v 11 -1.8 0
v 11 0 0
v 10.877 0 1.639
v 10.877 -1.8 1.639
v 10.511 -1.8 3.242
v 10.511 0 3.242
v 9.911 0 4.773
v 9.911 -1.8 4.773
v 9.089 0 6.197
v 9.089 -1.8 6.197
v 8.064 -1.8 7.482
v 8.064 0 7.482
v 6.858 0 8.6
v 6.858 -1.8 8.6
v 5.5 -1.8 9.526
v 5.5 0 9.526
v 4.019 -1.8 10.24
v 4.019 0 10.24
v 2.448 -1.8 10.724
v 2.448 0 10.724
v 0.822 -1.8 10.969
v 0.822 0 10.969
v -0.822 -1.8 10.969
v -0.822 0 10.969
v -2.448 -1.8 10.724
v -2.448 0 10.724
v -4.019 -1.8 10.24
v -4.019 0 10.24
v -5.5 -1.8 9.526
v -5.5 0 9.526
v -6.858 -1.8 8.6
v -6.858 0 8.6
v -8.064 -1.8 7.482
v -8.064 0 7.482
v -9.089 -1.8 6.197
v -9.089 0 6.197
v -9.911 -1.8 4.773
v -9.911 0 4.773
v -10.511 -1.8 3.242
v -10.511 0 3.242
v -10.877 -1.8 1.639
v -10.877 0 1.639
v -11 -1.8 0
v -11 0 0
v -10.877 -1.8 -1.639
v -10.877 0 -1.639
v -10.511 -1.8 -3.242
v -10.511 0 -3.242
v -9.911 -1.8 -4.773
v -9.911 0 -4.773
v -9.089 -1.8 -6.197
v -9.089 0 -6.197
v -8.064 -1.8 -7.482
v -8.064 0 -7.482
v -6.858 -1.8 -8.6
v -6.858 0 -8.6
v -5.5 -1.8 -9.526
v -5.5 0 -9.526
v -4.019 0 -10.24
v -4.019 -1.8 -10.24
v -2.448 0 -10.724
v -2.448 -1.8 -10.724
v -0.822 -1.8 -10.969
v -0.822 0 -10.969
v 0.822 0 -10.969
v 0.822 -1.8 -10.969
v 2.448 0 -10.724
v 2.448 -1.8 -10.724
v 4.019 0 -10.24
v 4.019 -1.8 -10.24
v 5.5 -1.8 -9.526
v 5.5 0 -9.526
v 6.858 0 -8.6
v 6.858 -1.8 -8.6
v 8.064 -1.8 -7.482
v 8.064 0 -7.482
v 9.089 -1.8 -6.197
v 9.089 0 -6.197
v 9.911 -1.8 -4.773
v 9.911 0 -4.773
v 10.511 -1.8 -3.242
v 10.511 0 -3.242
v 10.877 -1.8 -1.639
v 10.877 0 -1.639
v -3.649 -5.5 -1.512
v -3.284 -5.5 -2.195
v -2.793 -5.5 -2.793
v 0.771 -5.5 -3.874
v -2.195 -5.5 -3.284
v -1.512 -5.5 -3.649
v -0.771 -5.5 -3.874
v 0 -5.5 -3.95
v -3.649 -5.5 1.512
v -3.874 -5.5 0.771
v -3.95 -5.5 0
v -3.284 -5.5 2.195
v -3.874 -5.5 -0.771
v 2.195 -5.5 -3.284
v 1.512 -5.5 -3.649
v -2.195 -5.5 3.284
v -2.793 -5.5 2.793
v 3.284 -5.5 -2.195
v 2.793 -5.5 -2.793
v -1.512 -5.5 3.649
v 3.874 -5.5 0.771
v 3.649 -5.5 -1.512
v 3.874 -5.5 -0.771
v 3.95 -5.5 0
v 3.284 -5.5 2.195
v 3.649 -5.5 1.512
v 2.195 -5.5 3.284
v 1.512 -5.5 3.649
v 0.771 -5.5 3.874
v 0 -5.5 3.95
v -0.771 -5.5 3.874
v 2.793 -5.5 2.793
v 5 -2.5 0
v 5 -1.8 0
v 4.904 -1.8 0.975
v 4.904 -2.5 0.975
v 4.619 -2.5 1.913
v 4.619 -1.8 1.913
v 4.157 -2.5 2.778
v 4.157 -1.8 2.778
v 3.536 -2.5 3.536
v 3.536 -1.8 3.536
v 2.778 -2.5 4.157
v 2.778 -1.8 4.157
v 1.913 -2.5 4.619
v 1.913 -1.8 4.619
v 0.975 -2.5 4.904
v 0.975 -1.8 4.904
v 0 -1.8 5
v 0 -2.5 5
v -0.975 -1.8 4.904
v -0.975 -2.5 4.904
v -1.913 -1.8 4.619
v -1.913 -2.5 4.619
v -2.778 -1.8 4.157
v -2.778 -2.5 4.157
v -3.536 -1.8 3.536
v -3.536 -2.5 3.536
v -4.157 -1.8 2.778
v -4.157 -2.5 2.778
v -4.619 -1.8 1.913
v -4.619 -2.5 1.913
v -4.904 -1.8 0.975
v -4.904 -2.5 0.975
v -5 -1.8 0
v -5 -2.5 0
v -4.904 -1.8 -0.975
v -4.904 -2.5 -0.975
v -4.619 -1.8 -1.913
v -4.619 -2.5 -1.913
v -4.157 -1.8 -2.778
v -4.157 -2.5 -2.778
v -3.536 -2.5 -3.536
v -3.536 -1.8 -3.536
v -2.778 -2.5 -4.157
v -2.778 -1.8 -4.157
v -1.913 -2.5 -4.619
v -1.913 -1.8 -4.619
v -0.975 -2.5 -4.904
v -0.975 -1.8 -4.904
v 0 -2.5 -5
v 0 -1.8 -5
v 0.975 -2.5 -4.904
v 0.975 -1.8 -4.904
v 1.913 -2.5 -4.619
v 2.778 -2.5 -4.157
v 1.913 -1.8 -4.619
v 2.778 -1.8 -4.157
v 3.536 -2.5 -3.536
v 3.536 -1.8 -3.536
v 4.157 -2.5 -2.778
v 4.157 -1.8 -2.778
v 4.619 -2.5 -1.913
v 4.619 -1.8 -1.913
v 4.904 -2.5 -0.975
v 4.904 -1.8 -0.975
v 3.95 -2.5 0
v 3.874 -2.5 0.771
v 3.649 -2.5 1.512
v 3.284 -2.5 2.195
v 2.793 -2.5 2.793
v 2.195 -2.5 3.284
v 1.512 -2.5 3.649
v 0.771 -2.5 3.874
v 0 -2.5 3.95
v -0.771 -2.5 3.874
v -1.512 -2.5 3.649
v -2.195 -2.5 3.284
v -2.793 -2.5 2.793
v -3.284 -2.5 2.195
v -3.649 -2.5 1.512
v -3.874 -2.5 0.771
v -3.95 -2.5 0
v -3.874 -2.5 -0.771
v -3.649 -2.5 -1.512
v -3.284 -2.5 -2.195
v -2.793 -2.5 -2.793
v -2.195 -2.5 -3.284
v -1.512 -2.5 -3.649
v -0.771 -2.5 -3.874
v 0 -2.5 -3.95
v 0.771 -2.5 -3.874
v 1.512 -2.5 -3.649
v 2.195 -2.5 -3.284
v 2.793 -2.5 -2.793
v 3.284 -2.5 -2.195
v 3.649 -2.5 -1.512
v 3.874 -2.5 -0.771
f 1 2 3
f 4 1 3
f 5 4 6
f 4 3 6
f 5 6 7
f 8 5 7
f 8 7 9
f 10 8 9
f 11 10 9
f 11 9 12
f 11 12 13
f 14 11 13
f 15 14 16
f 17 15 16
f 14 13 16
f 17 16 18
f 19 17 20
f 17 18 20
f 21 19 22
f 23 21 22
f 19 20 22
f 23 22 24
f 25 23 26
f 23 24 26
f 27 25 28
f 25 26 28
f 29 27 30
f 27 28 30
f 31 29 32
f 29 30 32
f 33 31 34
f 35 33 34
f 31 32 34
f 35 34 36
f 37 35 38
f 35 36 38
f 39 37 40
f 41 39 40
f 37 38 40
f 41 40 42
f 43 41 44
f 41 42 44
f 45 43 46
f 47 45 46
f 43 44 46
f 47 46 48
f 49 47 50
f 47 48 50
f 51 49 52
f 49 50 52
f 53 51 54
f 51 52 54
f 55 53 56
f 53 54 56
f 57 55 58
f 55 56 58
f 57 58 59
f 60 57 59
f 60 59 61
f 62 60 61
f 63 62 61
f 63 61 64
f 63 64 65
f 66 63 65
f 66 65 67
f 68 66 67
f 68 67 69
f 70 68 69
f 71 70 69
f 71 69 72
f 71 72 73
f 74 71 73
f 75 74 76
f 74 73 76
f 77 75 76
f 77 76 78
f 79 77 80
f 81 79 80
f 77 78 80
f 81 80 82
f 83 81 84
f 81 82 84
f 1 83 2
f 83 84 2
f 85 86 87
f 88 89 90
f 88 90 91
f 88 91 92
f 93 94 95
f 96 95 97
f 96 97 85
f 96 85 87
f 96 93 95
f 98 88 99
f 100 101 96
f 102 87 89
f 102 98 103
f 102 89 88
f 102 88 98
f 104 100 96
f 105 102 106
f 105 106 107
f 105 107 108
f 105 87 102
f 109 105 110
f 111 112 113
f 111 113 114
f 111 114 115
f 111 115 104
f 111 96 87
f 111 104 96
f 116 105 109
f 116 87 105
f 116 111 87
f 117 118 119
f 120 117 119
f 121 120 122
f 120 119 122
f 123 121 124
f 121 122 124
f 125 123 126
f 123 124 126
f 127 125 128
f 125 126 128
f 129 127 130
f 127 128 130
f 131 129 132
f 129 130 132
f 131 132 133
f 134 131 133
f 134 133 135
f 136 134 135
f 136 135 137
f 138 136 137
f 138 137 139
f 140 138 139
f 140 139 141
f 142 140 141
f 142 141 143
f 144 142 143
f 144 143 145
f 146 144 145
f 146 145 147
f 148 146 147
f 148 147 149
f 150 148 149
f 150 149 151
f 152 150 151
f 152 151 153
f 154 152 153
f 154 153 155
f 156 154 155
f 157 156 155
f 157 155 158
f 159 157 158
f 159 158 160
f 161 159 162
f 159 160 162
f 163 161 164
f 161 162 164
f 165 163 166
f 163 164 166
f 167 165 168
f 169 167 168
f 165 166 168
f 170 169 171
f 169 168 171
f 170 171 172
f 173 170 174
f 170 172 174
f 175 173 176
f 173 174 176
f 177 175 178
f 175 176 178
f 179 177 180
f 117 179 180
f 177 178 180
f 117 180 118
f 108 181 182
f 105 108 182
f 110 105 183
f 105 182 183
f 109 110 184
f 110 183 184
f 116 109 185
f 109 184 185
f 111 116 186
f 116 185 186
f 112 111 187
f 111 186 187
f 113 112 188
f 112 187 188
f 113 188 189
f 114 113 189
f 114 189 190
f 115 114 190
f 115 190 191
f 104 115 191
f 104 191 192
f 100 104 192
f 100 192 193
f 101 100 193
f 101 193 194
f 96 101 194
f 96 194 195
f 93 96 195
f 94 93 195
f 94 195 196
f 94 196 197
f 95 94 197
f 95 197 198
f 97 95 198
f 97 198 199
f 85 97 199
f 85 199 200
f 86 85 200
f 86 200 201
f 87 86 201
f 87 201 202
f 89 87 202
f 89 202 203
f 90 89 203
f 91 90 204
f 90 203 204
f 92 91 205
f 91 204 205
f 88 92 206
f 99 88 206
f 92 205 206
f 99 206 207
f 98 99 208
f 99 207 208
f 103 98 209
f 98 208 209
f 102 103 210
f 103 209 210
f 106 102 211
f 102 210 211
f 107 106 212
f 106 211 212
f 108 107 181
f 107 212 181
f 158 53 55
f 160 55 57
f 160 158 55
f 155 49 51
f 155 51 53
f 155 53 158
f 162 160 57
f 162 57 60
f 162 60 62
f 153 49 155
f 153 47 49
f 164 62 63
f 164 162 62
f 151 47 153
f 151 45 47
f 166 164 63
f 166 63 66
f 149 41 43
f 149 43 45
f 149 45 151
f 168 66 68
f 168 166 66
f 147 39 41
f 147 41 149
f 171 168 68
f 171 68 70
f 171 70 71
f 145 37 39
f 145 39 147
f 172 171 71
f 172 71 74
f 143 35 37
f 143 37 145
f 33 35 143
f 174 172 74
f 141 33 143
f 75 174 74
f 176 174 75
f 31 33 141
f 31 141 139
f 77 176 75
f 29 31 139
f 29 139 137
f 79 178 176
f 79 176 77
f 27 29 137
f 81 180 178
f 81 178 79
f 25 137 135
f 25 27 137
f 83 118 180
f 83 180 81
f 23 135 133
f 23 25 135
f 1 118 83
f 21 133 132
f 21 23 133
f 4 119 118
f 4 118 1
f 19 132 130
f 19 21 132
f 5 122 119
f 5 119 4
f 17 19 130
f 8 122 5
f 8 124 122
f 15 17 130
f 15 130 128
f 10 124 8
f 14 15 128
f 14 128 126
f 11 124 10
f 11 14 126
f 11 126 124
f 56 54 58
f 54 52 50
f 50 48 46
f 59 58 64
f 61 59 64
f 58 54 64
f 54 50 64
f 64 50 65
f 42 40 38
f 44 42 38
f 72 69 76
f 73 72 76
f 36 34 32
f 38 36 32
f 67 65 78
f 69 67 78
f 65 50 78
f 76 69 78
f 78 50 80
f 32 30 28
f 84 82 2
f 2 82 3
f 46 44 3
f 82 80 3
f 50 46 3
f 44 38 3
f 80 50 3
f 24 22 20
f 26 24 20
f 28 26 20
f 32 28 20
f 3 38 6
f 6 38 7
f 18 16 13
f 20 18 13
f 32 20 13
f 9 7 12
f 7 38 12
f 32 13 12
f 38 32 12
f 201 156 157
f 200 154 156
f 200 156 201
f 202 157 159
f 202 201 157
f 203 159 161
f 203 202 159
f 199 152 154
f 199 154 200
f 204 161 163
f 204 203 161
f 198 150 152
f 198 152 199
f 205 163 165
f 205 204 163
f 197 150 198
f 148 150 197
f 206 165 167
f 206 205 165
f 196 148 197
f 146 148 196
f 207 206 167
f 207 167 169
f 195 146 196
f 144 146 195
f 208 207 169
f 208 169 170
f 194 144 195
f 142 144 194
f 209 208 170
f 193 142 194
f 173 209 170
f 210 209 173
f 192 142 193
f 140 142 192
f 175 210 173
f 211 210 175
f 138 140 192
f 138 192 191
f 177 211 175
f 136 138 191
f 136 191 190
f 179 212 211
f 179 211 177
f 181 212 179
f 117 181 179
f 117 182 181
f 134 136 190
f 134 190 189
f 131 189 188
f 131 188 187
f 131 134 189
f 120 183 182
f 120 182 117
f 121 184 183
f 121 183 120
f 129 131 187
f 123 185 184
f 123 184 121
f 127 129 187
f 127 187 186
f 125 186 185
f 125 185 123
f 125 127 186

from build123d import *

# Parameters (mm, degrees)
F0_R     = 11
F1_DEPTH = 1.8
F2_R     = 3.95
F3_DEPTH = 5.5
F4_R     = 5
F5_DEPTH = 2.5


with BuildPart() as f1:
    # F0 (on Front) → F1 (new body)
    with BuildSketch(Plane.XZ):
        Circle(F0_R)
    extrude(amount=F1_DEPTH)

    # F2 (on Front) → F3 (join)
    with BuildSketch(Plane.XZ):
        Circle(F2_R)
    extrude(amount=F3_DEPTH)

    # F4 (on Front) → F5 (join)
    with BuildSketch(Plane.XZ):
        Circle(F4_R)
    extrude(amount=F5_DEPTH)


solid = f1.part
